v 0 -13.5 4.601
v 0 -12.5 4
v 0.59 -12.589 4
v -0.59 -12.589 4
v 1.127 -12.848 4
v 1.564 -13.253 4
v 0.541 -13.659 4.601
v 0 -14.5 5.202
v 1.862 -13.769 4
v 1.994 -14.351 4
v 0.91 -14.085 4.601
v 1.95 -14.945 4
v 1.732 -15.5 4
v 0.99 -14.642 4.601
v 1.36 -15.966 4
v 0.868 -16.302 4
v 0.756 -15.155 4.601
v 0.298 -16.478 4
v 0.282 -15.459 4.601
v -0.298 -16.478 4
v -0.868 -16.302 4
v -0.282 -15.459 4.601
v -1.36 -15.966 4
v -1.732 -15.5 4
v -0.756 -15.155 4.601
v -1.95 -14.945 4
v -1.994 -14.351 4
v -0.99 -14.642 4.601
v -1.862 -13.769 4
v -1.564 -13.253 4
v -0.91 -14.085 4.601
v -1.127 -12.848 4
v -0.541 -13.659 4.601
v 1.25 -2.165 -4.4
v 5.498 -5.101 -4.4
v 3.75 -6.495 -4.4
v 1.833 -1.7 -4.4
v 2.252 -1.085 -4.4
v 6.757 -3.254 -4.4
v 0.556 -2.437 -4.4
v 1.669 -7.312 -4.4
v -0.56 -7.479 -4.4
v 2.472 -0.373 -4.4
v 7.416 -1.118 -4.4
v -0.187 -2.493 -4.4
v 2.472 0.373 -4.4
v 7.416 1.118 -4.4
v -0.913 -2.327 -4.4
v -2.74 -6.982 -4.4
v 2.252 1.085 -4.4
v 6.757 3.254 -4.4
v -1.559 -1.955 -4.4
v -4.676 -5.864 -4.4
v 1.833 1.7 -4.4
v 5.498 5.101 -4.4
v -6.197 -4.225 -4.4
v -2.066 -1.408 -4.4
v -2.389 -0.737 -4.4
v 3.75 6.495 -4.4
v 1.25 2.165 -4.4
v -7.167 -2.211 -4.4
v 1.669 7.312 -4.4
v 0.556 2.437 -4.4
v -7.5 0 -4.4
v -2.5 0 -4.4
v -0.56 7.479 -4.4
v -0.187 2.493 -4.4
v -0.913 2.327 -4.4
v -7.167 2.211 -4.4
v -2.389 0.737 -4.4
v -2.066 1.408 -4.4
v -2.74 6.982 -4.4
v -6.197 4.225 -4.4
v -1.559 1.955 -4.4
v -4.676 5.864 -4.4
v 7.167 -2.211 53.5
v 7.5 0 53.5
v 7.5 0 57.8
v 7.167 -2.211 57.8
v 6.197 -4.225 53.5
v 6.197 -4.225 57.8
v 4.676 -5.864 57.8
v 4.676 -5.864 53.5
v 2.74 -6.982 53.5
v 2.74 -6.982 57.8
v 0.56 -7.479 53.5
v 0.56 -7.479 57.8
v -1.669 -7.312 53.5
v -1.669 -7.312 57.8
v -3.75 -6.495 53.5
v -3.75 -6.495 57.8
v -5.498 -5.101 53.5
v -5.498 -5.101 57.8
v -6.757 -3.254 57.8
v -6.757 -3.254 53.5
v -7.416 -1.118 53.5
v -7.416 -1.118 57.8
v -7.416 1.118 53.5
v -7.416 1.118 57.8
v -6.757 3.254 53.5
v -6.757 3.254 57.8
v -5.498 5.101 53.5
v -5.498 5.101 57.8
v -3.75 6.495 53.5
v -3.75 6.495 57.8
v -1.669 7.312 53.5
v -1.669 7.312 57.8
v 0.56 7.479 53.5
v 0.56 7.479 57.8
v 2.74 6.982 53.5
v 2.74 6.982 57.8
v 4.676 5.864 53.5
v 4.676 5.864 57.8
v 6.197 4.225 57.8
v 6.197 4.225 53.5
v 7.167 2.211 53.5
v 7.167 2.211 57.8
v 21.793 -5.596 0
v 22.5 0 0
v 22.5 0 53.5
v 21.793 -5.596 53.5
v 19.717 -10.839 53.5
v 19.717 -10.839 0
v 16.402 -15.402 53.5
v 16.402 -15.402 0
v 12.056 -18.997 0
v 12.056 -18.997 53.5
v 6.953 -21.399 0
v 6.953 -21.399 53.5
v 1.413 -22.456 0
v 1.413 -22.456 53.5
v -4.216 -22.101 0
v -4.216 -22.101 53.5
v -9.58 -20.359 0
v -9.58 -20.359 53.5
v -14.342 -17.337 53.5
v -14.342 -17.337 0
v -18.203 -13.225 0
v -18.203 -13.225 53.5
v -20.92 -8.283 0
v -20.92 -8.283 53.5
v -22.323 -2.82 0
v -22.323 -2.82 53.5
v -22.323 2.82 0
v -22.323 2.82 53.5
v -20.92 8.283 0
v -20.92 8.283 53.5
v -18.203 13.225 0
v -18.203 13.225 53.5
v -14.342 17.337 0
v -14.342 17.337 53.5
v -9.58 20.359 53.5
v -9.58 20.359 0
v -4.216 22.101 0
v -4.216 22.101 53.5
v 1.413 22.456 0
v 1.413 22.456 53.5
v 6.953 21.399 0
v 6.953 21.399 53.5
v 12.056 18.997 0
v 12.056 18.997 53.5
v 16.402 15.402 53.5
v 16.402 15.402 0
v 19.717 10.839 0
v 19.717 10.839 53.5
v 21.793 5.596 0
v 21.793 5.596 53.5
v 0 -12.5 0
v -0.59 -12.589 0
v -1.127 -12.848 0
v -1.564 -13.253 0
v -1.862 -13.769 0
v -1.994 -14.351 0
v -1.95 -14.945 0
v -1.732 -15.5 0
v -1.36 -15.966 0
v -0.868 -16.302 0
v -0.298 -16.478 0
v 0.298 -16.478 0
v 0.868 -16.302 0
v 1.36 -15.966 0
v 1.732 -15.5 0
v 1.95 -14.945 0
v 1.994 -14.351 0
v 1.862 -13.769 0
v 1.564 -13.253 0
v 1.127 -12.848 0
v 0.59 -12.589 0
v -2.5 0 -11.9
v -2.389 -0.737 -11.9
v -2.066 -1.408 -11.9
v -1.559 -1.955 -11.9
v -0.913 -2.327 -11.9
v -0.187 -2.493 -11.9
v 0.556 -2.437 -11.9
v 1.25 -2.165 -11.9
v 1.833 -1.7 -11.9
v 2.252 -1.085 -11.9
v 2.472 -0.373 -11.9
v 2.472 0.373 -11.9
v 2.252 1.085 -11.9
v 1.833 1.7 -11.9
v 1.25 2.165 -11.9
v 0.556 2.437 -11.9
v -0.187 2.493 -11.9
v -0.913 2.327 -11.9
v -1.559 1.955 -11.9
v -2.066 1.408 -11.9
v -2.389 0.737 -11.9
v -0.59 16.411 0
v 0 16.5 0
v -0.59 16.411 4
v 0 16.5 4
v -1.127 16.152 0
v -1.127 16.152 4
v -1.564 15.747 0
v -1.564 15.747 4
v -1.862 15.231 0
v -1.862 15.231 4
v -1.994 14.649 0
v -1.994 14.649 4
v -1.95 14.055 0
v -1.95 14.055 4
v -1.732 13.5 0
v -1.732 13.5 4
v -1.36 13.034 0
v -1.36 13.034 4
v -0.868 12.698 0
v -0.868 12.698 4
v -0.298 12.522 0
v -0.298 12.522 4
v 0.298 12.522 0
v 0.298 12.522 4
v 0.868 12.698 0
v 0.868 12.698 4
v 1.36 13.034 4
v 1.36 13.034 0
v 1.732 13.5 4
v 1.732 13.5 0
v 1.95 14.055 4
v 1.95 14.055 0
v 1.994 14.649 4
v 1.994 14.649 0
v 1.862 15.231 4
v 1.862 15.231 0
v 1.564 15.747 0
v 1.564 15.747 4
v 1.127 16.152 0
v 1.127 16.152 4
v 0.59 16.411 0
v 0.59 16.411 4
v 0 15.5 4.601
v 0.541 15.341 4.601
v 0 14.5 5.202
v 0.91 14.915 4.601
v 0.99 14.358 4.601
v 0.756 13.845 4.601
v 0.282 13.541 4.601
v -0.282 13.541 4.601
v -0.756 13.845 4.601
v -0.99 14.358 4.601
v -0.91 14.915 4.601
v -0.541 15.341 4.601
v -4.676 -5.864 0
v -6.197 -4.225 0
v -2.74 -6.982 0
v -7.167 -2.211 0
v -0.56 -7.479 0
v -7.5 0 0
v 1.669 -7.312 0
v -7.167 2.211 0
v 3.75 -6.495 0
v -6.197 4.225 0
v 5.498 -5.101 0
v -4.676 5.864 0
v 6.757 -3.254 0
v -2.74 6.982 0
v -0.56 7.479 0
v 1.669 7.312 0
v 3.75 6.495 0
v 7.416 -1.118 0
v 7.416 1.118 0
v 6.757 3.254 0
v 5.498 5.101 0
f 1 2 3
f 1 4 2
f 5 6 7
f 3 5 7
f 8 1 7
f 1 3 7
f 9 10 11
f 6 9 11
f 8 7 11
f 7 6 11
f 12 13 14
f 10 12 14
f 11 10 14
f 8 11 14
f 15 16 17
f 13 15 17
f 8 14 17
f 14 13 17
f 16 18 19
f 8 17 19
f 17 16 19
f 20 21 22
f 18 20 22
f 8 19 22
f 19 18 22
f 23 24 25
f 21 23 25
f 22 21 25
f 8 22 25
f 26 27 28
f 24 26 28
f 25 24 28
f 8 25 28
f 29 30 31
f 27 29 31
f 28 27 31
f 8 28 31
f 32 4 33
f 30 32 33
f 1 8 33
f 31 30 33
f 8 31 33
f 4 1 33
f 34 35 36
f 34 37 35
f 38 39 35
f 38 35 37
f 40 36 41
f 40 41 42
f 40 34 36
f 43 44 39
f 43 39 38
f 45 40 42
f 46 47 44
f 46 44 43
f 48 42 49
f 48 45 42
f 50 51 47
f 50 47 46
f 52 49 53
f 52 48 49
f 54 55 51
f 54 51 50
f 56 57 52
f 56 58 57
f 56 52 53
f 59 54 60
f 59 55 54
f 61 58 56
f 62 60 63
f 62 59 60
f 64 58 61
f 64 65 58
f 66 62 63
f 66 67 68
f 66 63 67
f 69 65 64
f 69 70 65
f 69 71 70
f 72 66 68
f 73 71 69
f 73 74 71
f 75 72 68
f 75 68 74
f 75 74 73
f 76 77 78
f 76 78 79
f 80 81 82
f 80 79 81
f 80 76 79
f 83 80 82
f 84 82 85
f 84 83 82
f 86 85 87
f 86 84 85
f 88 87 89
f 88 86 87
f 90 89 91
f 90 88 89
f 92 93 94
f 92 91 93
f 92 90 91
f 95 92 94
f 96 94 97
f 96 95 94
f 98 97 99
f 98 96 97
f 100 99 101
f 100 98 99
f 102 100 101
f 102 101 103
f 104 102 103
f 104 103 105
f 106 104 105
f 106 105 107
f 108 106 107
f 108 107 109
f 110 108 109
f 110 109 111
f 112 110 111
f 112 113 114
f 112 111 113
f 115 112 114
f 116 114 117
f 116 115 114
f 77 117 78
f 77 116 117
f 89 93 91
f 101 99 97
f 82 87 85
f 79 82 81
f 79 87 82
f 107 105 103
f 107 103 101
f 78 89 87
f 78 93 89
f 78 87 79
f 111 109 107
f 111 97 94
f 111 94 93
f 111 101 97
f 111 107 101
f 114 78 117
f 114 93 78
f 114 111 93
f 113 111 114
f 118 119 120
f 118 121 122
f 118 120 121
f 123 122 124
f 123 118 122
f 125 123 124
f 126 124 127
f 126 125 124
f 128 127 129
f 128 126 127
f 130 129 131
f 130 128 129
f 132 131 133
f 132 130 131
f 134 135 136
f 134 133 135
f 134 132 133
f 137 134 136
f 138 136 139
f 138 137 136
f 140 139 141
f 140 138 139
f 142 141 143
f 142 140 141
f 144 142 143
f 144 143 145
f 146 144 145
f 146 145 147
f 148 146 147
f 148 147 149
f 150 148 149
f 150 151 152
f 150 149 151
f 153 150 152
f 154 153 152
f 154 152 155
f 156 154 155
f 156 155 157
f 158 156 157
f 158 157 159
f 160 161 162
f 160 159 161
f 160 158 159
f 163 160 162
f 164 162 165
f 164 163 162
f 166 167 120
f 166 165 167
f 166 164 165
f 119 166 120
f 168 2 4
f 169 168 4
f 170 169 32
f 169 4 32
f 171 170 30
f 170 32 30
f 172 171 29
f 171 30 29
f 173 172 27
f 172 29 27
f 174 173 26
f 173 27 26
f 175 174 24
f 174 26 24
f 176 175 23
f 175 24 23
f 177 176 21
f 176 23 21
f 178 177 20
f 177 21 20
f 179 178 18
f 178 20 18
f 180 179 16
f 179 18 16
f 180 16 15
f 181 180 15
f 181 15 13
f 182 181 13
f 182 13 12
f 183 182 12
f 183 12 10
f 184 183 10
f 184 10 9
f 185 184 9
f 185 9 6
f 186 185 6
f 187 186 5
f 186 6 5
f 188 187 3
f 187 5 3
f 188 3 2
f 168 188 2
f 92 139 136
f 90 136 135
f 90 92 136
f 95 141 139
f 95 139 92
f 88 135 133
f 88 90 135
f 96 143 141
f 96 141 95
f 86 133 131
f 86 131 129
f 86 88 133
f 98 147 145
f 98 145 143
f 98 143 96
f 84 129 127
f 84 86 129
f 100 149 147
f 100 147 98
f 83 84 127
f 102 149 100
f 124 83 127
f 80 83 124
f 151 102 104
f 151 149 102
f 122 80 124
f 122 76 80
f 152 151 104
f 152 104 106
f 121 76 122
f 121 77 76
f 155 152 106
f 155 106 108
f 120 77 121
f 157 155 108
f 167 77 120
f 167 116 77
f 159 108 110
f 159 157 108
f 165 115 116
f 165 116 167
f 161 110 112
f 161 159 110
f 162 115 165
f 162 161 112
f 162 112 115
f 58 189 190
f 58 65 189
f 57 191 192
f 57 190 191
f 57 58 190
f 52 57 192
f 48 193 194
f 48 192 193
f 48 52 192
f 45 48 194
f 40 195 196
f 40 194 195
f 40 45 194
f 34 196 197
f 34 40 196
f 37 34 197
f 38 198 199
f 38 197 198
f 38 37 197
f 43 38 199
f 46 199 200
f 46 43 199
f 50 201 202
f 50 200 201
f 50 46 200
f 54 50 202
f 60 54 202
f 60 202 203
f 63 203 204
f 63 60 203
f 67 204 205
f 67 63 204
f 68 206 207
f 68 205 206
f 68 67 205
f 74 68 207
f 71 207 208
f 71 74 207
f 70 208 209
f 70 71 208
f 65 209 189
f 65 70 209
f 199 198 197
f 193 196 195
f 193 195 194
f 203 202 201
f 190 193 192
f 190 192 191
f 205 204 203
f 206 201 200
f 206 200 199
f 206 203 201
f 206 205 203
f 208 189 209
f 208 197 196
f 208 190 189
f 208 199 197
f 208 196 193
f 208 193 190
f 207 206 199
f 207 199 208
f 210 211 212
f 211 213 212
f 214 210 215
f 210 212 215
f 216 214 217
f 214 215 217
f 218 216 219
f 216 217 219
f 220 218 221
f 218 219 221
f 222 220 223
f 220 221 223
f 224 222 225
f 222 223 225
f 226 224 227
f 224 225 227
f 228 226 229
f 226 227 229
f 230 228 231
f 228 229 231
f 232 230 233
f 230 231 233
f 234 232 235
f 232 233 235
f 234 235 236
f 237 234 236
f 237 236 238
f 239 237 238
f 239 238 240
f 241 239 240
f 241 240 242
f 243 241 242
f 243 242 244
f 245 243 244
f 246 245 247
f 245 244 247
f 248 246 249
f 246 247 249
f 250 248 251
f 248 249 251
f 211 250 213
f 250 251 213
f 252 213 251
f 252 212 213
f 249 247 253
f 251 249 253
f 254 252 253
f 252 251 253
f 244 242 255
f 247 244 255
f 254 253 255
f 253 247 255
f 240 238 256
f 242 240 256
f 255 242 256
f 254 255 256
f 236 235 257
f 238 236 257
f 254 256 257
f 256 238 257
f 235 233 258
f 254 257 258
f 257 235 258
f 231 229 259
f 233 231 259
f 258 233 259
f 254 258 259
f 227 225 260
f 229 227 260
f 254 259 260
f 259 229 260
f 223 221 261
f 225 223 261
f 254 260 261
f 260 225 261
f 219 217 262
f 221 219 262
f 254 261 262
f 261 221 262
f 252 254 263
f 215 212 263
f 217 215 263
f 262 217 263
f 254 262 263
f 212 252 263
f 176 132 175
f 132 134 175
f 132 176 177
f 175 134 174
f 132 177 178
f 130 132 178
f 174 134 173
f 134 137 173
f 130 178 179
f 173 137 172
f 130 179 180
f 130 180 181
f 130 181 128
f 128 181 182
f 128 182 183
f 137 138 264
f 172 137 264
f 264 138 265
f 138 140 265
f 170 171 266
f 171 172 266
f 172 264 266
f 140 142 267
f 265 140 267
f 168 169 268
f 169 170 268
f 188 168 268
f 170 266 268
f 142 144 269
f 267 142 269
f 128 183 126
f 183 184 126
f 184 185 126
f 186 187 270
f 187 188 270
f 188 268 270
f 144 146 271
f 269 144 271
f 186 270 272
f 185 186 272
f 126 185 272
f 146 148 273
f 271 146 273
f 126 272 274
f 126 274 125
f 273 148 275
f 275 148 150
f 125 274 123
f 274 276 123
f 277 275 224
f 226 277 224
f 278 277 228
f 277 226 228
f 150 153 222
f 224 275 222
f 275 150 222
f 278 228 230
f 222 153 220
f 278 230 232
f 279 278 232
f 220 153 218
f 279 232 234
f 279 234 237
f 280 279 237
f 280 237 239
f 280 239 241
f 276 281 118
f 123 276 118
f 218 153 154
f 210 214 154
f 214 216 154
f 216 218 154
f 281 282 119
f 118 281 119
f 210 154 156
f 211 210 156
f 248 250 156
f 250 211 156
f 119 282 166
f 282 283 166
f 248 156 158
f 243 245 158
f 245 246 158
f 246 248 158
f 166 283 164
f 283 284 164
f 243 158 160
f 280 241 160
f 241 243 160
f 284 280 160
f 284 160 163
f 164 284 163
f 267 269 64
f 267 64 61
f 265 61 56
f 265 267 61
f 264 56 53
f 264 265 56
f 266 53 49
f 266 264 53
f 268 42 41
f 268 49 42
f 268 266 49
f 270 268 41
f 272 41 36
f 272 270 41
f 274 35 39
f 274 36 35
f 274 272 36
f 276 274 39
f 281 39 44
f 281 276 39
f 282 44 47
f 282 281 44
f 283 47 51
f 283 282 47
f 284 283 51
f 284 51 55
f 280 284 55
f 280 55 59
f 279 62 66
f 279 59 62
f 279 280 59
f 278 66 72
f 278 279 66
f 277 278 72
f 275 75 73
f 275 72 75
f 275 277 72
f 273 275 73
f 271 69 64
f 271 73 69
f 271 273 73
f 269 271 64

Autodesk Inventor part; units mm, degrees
ref_plane "YZ Plane" through (0, 0, 0) normal (1, 0, 0) x (0, 1, 0)
ref_plane "XZ Plane" through (0, 0, 0) normal (0, 1, 0) x (-1, 0, 0)
ref_plane "XY Plane" through (0, 0, 0) normal (0, 0, 1) x (1, 0, 0)
sketch "スケッチ1" plane through (0, 0, 0) normal (0, 0, 1) x (1, 0, 0)
  circle A0 centre (0, 0) radius 22.5
  dimension "d0" = 45
extrude "押し出し1" add sketch "スケッチ1" along normal blind 53.5
sketch "スケッチ2" plane through (0, 0, 53.5) normal (0, 0, 1) x (1, 0, 0)
  circle A0 centre (0, 0) radius 7.5
  dimension "d3" = 15
extrude "押し出し2" add sketch "スケッチ2" along normal blind 4.3
sketch "スケッチ3" plane through (0, 0, 0) normal (0, 0, -1) x (-1, 0, 0)
  circle A0 centre (0, 0) radius 7.5 projected
  circle A1 centre (0, 0) radius 14.5
  point P0 (0, 14.5)
  point P1 (0, -14.5)
  dimension "d6" = 29
hole "穴1" at (0, 14.5, 0) at (0, -14.5, 0) direction (0, 0, 1) diameter 4 depth 4 tip angle 118
sketch "スケッチ4" plane through (0, 0, 0) normal (0, 0, -1) x (-1, 0, 0)
  circle A0 centre (0, 0) radius 7.5
  circle A1 centre (0, 0) radius 2.5
  dimension "d14" = 15
  dimension "d15" = 5
extrude "押し出し3" add sketch "スケッチ4" along normal blind 11.9 contours A1
sketch "スケッチ5" plane through (0, 0, 0) normal (0, 0, -1) x (-1, 0, 0)
  circle A0 centre (0, 0) radius 2.5 projected
  circle A1 centre (0, 0) radius 7.5
  dimension "d18" = 15
extrude "押し出し4" add sketch "スケッチ5" along normal blind 4.4
properties part number "rz735"
